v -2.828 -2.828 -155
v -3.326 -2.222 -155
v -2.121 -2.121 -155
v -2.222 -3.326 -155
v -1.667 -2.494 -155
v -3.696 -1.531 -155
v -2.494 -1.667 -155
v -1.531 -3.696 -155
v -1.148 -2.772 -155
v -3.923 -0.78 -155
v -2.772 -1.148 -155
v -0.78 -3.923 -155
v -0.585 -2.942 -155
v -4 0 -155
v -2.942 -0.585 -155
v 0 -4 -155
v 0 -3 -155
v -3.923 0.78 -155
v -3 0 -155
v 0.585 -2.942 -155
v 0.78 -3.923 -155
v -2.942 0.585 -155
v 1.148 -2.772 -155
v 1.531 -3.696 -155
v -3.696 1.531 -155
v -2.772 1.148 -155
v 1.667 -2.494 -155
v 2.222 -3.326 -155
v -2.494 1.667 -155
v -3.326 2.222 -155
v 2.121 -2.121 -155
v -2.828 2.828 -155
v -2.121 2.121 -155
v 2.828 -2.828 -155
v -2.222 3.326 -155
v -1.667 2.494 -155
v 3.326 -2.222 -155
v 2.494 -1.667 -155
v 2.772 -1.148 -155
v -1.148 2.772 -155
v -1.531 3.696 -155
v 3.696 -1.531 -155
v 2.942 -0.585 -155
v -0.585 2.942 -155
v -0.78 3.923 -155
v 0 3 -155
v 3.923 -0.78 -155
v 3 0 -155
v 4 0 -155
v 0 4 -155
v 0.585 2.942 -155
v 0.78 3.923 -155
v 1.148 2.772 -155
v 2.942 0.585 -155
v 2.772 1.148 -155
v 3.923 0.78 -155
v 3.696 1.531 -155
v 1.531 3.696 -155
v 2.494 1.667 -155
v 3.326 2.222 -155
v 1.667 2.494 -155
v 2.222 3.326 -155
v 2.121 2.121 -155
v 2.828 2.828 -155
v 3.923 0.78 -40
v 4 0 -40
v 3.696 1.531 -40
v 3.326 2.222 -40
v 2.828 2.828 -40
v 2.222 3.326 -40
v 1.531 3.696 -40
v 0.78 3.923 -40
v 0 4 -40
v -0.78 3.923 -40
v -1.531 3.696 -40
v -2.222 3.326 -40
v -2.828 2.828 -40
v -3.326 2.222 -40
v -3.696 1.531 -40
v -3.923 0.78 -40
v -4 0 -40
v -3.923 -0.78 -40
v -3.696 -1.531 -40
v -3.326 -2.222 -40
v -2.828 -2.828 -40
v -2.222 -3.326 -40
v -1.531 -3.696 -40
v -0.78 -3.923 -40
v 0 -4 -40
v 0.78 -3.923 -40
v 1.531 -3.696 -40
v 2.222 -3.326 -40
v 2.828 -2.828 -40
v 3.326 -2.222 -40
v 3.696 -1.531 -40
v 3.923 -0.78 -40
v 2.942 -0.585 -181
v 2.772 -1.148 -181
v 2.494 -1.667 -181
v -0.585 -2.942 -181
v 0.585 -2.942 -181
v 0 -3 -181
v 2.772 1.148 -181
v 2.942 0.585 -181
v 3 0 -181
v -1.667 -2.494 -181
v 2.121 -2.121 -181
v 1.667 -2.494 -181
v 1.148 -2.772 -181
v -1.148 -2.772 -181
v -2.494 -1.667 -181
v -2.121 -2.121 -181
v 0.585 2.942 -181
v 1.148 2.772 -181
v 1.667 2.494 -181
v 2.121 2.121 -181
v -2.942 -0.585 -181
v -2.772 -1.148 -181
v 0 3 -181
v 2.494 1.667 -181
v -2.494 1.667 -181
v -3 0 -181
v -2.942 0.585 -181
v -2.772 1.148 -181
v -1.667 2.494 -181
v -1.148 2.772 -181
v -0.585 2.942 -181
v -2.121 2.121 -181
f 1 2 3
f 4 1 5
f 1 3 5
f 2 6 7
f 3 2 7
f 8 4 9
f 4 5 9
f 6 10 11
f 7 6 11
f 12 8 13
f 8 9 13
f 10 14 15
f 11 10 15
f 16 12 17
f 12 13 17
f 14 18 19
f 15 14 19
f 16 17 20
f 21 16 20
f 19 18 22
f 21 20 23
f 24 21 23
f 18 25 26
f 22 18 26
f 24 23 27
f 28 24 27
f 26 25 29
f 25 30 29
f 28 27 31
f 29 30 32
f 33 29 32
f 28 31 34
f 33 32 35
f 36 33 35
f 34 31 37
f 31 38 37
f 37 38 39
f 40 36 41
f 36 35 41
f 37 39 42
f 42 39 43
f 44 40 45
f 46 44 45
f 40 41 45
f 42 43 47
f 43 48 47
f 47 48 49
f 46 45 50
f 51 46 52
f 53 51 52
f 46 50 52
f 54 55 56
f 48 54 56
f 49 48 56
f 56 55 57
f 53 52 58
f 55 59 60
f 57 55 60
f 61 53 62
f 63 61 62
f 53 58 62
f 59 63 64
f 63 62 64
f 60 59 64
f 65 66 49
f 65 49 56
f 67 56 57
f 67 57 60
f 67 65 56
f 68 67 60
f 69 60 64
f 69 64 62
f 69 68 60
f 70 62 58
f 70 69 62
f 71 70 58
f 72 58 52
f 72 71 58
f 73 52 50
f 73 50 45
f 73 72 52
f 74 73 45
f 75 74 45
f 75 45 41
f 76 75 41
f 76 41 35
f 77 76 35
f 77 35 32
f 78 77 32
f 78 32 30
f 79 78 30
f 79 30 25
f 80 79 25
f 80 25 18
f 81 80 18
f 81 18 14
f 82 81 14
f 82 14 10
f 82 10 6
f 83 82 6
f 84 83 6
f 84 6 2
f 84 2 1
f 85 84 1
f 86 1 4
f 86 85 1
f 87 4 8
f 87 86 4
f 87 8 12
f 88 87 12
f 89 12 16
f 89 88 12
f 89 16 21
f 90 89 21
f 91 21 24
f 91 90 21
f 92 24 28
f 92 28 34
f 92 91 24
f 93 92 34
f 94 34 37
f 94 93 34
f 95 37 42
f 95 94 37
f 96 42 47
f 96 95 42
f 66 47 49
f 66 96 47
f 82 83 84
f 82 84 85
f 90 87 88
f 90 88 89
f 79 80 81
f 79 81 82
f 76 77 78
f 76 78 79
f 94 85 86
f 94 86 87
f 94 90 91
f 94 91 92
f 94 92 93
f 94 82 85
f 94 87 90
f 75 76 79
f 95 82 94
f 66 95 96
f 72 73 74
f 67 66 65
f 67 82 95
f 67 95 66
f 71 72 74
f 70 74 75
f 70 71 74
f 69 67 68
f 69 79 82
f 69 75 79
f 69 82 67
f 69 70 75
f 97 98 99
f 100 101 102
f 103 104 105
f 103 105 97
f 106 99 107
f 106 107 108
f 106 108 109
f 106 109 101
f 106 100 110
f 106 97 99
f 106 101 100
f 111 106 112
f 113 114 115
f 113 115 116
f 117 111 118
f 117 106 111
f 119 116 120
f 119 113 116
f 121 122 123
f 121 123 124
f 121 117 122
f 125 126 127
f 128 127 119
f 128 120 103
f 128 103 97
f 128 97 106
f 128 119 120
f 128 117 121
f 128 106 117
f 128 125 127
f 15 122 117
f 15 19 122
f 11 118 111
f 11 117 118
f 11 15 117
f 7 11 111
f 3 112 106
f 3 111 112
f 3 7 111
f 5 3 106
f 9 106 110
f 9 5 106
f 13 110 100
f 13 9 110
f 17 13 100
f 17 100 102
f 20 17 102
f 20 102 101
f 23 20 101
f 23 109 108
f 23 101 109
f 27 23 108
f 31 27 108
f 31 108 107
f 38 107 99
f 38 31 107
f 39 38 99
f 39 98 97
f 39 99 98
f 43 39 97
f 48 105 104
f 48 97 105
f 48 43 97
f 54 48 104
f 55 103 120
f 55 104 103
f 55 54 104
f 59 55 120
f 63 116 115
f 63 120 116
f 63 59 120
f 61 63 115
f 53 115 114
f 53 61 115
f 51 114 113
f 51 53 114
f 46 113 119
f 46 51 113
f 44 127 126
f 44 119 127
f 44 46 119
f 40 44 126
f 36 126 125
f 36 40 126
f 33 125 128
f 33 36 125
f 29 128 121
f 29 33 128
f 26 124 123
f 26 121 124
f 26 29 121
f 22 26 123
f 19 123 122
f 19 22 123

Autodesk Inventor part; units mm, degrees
ref_plane "YZ Plane" through (0, 0, 0) normal (1, 0, 0) x (0, 1, 0)
ref_plane "XZ Plane" through (0, 0, 0) normal (0, 1, 0) x (-1, 0, 0)
ref_plane "XY Plane" through (0, 0, 0) normal (0, 0, 1) x (1, 0, 0)
sketch "スケッチ1" plane through (0, 0, 0) normal (0, 0, 1) x (1, 0, 0)
  circle A0 centre (0, 0) radius 4
  dimension "d0" = 8
extrude "押し出し1" add sketch "スケッチ1" against normal blind 155
sketch "スケッチ2" plane through (0, 0, -155) normal (0, 0, -1) x (-1, 0, 0)
  circle A0 centre (0, 0) radius 3
  dimension "d3" = 6
extrude "押し出し2" add sketch "スケッチ2" along normal blind 26
sketch "スケッチ3" plane through (0, 0, 0) normal (0, 0, 1) x (1, 0, 0)
  circle A0 centre (0, 0) radius 9.5613
extrude "押し出し3" cut sketch "スケッチ3" against normal blind 40
properties part number "円柱8mm" material "ステンレス鋼"
